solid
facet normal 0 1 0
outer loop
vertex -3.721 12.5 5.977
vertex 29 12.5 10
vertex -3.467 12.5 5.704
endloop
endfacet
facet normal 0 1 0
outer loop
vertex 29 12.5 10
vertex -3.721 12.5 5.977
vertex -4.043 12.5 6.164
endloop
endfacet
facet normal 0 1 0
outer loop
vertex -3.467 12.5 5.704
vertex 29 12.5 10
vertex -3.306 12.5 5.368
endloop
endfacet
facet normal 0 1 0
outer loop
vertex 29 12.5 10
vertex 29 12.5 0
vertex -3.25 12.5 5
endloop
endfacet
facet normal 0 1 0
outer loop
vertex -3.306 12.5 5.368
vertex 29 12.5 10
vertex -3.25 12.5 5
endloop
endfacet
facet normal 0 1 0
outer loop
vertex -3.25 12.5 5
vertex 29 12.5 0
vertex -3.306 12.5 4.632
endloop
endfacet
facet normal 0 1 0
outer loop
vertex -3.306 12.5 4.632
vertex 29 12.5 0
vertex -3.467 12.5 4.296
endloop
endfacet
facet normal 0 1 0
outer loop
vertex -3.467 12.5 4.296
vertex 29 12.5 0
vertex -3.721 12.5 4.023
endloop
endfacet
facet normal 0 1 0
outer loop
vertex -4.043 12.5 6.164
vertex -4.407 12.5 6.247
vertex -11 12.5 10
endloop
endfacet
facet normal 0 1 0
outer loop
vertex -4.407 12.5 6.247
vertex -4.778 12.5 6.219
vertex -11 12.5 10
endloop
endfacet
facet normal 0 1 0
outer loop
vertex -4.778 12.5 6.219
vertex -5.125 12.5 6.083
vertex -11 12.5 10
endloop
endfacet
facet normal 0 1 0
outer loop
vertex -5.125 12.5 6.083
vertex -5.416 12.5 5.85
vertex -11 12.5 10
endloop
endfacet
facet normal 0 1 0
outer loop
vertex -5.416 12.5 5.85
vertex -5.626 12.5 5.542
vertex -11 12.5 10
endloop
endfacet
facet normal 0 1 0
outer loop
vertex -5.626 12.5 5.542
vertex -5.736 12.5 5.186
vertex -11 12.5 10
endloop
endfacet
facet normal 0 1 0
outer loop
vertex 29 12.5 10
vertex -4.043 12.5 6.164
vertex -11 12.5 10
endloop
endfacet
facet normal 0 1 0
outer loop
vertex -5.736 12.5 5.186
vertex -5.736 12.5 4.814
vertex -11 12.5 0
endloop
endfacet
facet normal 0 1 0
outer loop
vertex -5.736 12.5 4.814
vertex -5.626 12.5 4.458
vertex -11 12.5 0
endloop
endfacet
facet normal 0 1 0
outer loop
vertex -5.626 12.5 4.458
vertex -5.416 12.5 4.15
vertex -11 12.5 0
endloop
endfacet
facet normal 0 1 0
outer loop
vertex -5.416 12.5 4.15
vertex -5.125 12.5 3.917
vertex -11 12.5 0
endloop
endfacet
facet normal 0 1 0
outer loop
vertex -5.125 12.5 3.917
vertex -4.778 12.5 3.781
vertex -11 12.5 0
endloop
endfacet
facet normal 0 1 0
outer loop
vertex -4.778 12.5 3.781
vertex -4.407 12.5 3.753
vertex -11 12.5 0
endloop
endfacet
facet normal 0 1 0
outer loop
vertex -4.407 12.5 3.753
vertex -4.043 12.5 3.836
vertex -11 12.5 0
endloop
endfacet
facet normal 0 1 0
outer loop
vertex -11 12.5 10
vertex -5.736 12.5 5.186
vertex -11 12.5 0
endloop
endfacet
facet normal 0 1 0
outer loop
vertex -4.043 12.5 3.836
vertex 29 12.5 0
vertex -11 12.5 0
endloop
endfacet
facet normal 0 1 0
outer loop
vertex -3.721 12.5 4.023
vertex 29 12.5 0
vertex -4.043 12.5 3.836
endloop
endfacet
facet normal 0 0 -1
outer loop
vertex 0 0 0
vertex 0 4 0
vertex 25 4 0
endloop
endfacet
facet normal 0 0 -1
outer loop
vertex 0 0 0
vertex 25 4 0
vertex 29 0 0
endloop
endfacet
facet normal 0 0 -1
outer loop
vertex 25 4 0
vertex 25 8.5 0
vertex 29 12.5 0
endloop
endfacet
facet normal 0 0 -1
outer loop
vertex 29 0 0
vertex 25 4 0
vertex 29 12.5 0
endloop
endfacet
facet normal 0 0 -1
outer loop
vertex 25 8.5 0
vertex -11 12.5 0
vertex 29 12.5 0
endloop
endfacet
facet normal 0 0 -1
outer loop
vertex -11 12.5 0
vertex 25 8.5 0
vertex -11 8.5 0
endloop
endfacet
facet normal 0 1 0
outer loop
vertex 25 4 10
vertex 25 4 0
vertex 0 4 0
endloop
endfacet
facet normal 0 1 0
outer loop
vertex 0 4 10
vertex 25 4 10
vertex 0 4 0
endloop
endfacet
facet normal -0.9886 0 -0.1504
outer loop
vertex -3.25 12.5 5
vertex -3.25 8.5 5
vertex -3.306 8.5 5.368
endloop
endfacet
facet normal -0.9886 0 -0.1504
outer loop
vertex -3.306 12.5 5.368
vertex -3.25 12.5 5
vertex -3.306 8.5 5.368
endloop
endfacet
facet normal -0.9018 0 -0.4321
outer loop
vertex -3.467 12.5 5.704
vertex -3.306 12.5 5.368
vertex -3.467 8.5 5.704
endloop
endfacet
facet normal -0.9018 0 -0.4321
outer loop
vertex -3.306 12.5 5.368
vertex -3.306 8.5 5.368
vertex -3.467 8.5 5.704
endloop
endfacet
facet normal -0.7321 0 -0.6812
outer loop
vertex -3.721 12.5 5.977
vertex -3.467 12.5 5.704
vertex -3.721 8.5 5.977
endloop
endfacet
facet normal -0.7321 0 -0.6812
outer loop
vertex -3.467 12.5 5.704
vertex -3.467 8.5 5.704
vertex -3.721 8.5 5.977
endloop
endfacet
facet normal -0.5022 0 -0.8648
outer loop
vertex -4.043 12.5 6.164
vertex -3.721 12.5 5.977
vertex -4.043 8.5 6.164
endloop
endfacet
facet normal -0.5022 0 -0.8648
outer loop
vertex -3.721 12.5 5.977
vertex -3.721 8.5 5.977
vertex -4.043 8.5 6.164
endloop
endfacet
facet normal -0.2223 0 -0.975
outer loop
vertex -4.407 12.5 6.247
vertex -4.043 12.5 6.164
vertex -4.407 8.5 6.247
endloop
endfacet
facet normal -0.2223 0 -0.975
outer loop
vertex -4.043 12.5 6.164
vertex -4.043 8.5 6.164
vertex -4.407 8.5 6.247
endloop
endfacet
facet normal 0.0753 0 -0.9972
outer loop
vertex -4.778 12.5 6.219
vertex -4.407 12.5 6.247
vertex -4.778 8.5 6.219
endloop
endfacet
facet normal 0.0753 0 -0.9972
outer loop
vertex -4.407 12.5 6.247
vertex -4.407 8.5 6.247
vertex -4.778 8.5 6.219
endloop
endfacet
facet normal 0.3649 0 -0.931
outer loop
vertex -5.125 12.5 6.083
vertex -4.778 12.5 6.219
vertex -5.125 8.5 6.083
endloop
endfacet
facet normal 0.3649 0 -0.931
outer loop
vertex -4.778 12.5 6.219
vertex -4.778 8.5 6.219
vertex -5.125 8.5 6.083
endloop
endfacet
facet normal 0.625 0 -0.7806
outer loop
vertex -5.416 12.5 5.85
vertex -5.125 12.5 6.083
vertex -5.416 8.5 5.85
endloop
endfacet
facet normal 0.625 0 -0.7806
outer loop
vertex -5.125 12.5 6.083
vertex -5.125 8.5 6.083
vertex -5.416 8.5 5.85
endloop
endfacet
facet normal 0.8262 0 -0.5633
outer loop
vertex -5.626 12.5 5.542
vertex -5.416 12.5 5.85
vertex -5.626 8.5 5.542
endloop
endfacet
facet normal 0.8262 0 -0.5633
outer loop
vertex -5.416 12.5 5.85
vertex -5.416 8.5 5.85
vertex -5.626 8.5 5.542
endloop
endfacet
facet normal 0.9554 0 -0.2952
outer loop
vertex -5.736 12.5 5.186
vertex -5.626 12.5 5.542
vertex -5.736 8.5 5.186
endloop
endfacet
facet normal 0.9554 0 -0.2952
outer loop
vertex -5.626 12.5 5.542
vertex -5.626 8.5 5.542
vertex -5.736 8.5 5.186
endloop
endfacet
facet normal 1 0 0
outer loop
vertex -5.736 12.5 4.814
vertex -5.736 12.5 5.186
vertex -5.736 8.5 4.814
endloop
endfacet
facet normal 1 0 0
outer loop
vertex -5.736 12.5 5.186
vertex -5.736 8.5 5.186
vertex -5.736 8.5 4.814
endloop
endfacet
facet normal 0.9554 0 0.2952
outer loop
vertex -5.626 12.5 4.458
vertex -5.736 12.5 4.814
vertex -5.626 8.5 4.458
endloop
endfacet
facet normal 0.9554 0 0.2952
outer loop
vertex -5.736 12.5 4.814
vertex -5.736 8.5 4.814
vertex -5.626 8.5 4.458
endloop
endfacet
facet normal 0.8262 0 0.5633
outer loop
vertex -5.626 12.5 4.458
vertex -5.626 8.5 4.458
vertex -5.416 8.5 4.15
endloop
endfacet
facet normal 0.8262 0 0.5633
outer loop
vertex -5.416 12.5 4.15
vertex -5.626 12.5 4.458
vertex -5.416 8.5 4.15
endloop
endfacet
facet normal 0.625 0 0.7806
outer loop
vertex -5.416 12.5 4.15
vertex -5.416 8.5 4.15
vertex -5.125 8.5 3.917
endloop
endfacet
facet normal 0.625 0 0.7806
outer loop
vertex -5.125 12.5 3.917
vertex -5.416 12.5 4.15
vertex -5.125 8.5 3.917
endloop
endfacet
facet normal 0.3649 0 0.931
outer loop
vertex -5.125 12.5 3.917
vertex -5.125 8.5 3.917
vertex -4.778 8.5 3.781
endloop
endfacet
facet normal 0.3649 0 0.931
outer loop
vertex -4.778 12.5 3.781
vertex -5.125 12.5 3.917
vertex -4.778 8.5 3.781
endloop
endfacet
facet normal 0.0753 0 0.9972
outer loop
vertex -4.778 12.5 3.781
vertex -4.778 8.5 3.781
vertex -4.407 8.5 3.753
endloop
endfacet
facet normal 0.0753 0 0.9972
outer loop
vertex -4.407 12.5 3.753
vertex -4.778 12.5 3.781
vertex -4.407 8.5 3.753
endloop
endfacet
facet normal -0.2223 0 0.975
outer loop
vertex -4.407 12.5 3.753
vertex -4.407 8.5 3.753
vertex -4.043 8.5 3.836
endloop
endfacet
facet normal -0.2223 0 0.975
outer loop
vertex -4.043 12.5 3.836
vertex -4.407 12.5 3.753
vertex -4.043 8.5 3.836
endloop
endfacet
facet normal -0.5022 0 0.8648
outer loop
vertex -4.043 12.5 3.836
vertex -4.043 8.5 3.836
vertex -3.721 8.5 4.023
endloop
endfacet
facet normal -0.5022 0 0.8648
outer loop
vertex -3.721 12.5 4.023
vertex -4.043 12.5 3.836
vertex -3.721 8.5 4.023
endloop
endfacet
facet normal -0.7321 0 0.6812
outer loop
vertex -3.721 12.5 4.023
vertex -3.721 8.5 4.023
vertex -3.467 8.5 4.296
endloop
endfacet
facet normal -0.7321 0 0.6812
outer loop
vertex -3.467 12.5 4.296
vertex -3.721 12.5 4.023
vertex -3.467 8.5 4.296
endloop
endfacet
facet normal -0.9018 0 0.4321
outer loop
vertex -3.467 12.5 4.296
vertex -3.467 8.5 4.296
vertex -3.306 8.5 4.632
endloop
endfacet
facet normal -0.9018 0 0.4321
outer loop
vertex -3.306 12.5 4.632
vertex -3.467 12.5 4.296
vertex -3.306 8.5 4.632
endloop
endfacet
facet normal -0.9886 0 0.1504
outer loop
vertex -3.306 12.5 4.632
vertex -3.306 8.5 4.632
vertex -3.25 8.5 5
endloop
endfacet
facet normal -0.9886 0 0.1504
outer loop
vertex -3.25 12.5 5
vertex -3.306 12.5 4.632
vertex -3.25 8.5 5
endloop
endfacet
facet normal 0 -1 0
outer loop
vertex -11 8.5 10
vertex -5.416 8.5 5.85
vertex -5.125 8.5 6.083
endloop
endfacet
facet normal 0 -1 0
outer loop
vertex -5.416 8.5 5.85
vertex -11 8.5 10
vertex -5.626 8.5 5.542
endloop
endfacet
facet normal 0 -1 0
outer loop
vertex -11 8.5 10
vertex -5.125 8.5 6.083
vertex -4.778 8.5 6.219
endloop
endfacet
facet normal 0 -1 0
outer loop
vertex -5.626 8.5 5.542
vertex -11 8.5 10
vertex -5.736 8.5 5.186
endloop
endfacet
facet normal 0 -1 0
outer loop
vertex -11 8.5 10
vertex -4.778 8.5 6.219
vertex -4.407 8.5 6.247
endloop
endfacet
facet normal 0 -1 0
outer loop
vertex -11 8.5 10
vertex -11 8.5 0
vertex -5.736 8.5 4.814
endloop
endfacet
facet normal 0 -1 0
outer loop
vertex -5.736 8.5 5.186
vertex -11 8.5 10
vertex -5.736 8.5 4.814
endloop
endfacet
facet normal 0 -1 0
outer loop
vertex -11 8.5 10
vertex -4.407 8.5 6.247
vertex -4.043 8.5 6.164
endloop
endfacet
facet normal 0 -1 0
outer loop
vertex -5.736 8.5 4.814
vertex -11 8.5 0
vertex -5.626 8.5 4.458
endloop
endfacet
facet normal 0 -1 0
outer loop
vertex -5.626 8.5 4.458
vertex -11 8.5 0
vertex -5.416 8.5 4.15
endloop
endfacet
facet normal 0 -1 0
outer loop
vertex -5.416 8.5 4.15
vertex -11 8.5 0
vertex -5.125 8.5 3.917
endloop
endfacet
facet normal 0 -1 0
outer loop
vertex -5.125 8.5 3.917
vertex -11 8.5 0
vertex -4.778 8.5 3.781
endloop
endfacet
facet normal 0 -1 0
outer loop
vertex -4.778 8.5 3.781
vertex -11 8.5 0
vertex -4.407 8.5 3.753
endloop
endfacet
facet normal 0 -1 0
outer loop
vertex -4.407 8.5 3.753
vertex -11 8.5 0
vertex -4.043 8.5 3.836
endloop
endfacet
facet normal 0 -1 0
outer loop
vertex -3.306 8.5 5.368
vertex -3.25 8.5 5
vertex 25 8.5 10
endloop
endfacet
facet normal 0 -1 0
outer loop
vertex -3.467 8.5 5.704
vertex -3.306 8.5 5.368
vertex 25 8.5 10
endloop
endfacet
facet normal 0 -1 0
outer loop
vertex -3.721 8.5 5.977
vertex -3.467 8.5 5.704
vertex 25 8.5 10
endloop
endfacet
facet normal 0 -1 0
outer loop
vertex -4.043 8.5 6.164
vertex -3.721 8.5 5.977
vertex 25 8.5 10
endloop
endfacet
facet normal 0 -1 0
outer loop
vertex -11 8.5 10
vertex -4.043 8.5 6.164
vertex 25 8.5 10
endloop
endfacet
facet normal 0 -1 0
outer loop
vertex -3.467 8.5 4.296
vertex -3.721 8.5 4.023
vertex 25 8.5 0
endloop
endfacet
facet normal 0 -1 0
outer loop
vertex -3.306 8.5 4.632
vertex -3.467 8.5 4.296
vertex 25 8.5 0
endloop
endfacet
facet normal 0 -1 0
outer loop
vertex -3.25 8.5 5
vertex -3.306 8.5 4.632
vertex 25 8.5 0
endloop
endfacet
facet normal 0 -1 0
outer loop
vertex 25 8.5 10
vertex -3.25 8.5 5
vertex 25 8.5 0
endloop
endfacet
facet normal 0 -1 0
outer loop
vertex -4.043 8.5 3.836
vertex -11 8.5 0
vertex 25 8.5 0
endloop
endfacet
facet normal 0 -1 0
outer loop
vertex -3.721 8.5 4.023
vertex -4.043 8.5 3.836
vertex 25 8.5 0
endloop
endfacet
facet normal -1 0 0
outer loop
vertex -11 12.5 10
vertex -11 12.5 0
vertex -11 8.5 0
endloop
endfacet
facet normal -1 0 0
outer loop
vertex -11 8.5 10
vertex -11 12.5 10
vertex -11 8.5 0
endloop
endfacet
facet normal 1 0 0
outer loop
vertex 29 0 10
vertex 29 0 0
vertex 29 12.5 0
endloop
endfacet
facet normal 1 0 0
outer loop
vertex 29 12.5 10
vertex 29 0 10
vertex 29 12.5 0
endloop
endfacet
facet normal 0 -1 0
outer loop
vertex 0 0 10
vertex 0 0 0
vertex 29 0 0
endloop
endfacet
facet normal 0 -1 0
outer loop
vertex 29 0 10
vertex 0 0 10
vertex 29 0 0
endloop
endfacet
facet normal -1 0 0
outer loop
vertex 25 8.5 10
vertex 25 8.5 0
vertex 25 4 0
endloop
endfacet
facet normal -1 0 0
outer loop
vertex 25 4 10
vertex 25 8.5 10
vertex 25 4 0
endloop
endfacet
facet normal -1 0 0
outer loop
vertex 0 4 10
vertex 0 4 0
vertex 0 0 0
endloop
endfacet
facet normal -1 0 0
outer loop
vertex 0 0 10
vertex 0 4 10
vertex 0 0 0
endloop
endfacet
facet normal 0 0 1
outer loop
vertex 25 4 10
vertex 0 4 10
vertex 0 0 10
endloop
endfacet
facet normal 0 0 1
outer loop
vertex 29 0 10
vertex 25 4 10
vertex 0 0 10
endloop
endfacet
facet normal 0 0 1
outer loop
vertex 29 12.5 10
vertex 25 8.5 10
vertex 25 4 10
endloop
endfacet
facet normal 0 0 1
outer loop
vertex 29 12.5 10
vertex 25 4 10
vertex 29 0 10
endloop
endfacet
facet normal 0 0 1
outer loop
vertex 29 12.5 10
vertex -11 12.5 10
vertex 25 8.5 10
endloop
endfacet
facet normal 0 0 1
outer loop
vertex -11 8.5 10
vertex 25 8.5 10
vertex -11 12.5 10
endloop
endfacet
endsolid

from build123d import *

# Parameters (mm, degrees)
F1_DEPTH = 10
F2_R     = 1.25
F3_DEPTH = 25


with BuildPart() as f1:
    # F0 (on Top) → F1 (new body)
    with BuildSketch(Plane.XY):
        Polygon((0, 4), (0, 0), (29, 0), (29, 12.5), (-11, 12.5), (-11, 8.5), (25, 8.5), (25, 4), align=None)
    extrude(amount=F1_DEPTH)

    # F2 (on face) → F3 (cut)
    with BuildSketch(Plane.XZ.offset(-8.5)):
        with Locations((-4.5, 5)):
            Circle(F2_R)
    extrude(amount=-F3_DEPTH, mode=Mode.SUBTRACT)


solid = f1.part
